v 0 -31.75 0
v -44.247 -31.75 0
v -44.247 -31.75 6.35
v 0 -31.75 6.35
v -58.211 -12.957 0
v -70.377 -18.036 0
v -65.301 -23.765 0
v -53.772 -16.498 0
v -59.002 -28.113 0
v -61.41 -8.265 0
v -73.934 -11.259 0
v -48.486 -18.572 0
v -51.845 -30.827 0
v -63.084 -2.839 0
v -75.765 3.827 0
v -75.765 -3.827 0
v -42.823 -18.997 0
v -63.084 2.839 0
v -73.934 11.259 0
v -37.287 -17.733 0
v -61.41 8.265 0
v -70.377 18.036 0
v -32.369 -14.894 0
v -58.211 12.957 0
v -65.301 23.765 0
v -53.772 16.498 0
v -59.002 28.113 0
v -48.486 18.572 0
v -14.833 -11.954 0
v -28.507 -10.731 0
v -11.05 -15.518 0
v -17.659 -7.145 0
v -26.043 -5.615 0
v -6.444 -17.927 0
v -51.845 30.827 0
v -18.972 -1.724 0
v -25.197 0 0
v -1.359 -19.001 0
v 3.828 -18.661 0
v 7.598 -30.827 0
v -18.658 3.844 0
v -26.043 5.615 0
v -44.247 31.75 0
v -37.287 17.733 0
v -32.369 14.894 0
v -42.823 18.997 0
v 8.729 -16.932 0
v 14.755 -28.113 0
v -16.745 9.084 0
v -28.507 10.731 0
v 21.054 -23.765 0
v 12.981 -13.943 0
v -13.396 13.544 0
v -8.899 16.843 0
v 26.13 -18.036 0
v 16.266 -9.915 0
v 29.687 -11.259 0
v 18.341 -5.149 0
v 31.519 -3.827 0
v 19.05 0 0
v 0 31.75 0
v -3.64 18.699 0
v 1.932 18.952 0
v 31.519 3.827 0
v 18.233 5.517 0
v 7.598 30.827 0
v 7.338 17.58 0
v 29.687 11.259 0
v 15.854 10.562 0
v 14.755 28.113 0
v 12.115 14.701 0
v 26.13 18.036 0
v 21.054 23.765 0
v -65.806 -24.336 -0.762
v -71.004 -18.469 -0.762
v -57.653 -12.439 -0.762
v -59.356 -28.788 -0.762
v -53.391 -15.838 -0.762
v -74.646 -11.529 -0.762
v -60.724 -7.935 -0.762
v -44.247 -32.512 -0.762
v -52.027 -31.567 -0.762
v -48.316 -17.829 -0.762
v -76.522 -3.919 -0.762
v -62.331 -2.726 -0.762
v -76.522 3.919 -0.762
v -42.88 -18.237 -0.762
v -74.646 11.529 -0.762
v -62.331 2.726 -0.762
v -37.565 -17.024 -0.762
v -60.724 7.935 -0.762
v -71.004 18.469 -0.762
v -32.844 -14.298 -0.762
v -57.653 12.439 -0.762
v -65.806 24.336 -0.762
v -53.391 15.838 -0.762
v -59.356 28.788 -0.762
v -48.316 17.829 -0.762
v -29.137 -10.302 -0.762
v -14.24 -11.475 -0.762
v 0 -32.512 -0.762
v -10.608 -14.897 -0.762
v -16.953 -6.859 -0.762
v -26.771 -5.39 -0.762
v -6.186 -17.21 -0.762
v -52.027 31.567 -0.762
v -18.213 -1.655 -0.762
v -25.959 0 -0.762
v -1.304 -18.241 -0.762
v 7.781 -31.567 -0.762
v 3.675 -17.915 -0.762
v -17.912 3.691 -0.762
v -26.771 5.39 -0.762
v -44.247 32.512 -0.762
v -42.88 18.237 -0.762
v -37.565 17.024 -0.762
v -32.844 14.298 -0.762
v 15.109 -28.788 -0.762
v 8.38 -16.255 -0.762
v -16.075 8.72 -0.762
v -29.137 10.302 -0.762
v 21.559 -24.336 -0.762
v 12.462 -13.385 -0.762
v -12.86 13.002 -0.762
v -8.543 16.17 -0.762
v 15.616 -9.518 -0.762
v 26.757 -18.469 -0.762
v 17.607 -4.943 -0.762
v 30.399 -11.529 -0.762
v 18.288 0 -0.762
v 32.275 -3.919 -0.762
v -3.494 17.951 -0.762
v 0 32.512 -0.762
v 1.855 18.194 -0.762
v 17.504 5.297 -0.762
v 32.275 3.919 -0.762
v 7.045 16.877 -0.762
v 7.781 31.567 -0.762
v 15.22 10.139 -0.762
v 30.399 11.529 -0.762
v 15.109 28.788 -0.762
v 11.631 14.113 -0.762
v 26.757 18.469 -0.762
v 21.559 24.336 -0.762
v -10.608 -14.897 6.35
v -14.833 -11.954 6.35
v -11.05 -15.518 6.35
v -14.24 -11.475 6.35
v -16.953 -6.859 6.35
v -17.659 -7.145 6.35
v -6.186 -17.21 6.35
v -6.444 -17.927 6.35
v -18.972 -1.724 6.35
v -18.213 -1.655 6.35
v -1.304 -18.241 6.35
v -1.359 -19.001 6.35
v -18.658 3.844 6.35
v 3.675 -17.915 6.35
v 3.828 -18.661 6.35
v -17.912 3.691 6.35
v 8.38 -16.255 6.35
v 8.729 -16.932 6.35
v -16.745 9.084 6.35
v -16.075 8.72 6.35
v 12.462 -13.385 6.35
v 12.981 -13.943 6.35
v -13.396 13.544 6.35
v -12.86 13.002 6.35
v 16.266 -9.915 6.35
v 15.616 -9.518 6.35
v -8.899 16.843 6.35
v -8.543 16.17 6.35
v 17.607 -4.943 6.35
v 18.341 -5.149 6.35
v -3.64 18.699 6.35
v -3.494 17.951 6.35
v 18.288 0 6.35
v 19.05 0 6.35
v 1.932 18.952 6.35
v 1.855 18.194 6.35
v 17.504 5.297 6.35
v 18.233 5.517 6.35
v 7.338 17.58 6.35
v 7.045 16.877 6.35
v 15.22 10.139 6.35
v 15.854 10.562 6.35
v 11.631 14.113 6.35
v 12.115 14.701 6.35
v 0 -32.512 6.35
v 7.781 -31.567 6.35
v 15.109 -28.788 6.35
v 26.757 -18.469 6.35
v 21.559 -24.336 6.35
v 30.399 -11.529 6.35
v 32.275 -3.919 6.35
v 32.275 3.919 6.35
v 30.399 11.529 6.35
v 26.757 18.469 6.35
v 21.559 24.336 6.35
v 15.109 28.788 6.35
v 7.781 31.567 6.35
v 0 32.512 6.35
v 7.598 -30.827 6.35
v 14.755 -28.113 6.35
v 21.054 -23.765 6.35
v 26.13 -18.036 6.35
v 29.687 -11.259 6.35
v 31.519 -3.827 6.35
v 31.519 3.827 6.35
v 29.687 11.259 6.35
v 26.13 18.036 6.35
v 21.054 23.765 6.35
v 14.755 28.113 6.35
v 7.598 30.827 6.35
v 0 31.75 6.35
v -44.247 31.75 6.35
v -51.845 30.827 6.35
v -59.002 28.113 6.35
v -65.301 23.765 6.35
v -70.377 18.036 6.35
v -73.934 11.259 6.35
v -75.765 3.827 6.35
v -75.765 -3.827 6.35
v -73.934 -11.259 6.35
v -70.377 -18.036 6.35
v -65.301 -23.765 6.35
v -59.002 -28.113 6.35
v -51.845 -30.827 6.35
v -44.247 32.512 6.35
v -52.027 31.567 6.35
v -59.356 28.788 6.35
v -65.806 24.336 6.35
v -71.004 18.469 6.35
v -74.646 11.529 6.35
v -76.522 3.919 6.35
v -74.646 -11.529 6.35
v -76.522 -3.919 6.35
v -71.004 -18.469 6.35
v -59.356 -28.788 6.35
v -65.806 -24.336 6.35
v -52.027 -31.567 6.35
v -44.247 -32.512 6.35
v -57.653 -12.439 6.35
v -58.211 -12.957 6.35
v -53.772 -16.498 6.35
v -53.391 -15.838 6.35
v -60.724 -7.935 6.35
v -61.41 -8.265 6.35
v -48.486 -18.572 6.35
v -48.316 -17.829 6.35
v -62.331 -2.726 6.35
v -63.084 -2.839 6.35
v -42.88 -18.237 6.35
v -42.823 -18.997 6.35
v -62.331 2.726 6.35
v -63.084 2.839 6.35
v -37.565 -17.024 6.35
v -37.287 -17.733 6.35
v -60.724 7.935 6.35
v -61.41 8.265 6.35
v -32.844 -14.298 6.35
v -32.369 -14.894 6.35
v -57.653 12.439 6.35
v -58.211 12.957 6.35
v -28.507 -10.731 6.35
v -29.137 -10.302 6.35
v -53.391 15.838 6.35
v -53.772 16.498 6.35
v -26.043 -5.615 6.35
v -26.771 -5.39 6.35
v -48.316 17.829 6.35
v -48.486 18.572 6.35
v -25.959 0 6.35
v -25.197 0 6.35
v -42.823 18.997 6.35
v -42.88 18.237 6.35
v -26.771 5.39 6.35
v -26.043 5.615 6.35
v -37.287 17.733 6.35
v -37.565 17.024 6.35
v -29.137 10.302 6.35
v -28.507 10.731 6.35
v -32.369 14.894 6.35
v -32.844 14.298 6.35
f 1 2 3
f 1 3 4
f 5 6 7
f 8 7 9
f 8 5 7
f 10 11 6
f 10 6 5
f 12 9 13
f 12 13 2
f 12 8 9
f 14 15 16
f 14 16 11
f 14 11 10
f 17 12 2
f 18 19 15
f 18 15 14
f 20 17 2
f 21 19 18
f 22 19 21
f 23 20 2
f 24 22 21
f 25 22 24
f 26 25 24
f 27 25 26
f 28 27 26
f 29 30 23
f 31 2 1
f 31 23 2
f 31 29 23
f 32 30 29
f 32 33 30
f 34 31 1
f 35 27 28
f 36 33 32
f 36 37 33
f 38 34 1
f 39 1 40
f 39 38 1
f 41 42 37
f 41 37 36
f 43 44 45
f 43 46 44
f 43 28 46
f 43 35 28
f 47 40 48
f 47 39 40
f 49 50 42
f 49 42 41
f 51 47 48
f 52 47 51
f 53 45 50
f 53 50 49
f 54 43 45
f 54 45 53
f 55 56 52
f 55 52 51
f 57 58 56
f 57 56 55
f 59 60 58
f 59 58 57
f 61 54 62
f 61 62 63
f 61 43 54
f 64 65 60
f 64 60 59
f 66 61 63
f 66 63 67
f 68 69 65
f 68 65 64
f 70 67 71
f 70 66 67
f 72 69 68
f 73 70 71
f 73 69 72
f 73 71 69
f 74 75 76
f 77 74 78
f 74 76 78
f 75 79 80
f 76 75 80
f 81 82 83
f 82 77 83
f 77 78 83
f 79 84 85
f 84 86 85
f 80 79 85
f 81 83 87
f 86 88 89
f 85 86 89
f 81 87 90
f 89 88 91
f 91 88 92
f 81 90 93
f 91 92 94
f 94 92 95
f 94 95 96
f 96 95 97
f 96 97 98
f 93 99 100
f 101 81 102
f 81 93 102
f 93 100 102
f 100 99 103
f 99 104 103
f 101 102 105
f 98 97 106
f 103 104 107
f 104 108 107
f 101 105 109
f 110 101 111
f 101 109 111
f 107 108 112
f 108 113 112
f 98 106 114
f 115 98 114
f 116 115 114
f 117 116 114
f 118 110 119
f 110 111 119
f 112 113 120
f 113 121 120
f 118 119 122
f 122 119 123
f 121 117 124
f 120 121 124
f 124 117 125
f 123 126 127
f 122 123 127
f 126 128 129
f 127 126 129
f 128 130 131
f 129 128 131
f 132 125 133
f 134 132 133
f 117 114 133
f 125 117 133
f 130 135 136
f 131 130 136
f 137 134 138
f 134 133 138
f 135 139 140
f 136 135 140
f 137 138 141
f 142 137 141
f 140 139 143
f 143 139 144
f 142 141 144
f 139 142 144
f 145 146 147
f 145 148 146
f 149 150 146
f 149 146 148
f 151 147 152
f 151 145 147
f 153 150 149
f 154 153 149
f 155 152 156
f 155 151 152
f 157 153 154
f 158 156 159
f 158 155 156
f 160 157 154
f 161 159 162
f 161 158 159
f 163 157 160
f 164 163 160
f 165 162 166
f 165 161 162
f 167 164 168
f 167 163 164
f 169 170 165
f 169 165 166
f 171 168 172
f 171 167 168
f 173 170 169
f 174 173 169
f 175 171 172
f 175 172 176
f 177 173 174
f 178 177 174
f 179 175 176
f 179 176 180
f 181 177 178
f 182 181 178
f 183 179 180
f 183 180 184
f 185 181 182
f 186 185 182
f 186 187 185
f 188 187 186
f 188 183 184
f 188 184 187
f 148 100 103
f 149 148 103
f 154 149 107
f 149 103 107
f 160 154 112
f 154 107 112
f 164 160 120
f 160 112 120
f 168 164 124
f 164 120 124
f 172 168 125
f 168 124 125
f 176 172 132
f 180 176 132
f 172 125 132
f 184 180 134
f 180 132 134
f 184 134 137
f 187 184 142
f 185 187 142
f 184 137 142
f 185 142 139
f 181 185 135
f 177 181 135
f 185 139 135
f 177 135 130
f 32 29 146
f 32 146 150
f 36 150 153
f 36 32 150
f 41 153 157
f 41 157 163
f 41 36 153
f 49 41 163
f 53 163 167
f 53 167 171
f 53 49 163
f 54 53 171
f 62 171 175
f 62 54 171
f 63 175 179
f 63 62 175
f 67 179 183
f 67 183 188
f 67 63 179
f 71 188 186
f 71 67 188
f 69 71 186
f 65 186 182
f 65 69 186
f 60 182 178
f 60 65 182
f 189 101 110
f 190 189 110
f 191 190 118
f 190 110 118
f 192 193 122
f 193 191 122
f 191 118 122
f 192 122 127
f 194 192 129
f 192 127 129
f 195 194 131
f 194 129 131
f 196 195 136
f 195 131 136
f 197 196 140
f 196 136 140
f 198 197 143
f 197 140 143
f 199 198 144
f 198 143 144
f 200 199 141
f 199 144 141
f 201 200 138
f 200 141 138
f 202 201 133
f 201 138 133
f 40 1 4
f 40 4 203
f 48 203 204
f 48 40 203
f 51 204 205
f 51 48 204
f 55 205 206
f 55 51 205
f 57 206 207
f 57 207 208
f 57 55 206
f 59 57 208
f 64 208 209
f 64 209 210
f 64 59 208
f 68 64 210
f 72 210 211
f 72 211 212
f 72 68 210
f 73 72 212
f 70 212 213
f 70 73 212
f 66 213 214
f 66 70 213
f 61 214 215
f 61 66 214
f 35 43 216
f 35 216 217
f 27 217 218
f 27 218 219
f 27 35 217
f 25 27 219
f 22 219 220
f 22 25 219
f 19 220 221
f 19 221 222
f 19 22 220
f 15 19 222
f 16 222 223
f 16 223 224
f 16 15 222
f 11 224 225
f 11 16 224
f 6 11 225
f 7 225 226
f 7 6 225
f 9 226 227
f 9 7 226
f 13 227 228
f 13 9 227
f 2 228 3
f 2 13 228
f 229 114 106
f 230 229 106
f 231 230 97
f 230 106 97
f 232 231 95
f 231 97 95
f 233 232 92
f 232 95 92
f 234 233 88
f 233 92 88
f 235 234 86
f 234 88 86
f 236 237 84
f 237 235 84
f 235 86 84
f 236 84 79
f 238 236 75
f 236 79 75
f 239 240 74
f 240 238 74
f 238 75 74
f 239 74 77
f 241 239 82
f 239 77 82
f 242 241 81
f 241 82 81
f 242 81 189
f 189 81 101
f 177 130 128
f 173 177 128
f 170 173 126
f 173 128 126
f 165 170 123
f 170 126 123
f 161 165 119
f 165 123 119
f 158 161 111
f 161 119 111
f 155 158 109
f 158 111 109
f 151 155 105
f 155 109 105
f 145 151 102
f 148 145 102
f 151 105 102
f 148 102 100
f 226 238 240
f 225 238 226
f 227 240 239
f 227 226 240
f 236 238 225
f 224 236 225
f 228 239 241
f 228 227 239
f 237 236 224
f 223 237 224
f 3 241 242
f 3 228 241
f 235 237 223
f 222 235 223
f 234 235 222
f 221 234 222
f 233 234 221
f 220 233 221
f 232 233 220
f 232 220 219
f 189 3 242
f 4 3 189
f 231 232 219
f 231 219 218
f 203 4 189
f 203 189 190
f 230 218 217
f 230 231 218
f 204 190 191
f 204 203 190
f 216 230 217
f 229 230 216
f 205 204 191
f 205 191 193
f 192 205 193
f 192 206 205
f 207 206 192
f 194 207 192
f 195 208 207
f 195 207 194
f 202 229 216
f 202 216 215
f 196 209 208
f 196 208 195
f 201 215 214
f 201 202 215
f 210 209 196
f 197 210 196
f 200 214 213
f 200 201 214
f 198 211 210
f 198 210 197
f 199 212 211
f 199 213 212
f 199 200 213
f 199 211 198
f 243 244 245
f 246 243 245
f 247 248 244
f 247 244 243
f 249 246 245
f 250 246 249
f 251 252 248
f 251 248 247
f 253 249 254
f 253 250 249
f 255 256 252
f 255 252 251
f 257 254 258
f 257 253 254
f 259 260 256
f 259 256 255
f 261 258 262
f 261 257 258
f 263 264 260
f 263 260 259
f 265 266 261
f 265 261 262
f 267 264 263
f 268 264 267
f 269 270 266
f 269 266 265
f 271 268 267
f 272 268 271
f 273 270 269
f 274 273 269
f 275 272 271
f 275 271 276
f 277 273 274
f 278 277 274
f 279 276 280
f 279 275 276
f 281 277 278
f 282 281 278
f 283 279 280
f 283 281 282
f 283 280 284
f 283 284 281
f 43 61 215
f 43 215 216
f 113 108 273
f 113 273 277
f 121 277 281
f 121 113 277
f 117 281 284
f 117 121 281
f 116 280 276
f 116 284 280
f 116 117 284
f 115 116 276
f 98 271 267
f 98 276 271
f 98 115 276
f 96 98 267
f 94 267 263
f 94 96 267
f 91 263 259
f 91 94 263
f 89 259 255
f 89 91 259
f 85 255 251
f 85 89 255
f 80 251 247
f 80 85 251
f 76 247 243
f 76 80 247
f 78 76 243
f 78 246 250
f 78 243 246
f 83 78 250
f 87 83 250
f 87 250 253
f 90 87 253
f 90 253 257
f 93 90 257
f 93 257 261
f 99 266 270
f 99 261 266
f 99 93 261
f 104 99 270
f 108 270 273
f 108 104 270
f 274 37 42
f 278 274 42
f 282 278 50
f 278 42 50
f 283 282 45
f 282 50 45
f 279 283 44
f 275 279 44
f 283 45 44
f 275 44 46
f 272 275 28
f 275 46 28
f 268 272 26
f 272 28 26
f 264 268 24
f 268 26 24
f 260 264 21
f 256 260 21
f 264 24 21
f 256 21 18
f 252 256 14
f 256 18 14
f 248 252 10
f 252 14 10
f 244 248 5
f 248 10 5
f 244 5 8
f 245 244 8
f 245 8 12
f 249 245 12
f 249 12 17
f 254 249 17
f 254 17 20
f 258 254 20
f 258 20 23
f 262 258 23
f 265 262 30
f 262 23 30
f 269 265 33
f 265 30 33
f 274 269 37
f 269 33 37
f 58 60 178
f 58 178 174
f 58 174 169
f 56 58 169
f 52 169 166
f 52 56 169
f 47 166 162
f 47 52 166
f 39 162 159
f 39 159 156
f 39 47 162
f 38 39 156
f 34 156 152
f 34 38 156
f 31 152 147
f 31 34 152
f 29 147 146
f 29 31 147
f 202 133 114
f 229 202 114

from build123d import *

# Parameters (mm, degrees)
F0_R     = 19.05
F1_DEPTH = 6.35
F2_T     = 0.762


with BuildPart() as f1:
    # F0 (on Top) → F1 (new body)
    with BuildSketch(Plane.XY):
        with BuildLine():
            Line((0, 31.75), (-44.2468, 31.75))
            ThreePointArc((-44.2468, 31.75), (-75.9968, 0), (-44.2468, -31.75))
            Line((-44.2468, -31.75), (0, -31.75))
            ThreePointArc((0, -31.75), (31.75, 0), (0, 31.75))
        make_face()
        with Locations((-44.2468, 0)):
            Circle(F0_R, mode=Mode.SUBTRACT)
        with BuildLine():
            ThreePointArc((-14.8329292767, -11.9535228729), (-6.3377913061, 17.9648240003), (19.05, 0))
            ThreePointArc((19.05, 0), (6.3377913061, -17.9648240003), (-14.8329292767, -11.9535228729))
        make_face(mode=Mode.SUBTRACT)
    extrude(amount=F1_DEPTH)

    # F2
    f2_openings = [f1.faces().sort_by_distance(p)[0] for p in [
        (-22.1234, 0, 6.35),
    ]]
    offset(amount=F2_T, openings=f2_openings, kind=Kind.INTERSECTION)


solid = f1.part
